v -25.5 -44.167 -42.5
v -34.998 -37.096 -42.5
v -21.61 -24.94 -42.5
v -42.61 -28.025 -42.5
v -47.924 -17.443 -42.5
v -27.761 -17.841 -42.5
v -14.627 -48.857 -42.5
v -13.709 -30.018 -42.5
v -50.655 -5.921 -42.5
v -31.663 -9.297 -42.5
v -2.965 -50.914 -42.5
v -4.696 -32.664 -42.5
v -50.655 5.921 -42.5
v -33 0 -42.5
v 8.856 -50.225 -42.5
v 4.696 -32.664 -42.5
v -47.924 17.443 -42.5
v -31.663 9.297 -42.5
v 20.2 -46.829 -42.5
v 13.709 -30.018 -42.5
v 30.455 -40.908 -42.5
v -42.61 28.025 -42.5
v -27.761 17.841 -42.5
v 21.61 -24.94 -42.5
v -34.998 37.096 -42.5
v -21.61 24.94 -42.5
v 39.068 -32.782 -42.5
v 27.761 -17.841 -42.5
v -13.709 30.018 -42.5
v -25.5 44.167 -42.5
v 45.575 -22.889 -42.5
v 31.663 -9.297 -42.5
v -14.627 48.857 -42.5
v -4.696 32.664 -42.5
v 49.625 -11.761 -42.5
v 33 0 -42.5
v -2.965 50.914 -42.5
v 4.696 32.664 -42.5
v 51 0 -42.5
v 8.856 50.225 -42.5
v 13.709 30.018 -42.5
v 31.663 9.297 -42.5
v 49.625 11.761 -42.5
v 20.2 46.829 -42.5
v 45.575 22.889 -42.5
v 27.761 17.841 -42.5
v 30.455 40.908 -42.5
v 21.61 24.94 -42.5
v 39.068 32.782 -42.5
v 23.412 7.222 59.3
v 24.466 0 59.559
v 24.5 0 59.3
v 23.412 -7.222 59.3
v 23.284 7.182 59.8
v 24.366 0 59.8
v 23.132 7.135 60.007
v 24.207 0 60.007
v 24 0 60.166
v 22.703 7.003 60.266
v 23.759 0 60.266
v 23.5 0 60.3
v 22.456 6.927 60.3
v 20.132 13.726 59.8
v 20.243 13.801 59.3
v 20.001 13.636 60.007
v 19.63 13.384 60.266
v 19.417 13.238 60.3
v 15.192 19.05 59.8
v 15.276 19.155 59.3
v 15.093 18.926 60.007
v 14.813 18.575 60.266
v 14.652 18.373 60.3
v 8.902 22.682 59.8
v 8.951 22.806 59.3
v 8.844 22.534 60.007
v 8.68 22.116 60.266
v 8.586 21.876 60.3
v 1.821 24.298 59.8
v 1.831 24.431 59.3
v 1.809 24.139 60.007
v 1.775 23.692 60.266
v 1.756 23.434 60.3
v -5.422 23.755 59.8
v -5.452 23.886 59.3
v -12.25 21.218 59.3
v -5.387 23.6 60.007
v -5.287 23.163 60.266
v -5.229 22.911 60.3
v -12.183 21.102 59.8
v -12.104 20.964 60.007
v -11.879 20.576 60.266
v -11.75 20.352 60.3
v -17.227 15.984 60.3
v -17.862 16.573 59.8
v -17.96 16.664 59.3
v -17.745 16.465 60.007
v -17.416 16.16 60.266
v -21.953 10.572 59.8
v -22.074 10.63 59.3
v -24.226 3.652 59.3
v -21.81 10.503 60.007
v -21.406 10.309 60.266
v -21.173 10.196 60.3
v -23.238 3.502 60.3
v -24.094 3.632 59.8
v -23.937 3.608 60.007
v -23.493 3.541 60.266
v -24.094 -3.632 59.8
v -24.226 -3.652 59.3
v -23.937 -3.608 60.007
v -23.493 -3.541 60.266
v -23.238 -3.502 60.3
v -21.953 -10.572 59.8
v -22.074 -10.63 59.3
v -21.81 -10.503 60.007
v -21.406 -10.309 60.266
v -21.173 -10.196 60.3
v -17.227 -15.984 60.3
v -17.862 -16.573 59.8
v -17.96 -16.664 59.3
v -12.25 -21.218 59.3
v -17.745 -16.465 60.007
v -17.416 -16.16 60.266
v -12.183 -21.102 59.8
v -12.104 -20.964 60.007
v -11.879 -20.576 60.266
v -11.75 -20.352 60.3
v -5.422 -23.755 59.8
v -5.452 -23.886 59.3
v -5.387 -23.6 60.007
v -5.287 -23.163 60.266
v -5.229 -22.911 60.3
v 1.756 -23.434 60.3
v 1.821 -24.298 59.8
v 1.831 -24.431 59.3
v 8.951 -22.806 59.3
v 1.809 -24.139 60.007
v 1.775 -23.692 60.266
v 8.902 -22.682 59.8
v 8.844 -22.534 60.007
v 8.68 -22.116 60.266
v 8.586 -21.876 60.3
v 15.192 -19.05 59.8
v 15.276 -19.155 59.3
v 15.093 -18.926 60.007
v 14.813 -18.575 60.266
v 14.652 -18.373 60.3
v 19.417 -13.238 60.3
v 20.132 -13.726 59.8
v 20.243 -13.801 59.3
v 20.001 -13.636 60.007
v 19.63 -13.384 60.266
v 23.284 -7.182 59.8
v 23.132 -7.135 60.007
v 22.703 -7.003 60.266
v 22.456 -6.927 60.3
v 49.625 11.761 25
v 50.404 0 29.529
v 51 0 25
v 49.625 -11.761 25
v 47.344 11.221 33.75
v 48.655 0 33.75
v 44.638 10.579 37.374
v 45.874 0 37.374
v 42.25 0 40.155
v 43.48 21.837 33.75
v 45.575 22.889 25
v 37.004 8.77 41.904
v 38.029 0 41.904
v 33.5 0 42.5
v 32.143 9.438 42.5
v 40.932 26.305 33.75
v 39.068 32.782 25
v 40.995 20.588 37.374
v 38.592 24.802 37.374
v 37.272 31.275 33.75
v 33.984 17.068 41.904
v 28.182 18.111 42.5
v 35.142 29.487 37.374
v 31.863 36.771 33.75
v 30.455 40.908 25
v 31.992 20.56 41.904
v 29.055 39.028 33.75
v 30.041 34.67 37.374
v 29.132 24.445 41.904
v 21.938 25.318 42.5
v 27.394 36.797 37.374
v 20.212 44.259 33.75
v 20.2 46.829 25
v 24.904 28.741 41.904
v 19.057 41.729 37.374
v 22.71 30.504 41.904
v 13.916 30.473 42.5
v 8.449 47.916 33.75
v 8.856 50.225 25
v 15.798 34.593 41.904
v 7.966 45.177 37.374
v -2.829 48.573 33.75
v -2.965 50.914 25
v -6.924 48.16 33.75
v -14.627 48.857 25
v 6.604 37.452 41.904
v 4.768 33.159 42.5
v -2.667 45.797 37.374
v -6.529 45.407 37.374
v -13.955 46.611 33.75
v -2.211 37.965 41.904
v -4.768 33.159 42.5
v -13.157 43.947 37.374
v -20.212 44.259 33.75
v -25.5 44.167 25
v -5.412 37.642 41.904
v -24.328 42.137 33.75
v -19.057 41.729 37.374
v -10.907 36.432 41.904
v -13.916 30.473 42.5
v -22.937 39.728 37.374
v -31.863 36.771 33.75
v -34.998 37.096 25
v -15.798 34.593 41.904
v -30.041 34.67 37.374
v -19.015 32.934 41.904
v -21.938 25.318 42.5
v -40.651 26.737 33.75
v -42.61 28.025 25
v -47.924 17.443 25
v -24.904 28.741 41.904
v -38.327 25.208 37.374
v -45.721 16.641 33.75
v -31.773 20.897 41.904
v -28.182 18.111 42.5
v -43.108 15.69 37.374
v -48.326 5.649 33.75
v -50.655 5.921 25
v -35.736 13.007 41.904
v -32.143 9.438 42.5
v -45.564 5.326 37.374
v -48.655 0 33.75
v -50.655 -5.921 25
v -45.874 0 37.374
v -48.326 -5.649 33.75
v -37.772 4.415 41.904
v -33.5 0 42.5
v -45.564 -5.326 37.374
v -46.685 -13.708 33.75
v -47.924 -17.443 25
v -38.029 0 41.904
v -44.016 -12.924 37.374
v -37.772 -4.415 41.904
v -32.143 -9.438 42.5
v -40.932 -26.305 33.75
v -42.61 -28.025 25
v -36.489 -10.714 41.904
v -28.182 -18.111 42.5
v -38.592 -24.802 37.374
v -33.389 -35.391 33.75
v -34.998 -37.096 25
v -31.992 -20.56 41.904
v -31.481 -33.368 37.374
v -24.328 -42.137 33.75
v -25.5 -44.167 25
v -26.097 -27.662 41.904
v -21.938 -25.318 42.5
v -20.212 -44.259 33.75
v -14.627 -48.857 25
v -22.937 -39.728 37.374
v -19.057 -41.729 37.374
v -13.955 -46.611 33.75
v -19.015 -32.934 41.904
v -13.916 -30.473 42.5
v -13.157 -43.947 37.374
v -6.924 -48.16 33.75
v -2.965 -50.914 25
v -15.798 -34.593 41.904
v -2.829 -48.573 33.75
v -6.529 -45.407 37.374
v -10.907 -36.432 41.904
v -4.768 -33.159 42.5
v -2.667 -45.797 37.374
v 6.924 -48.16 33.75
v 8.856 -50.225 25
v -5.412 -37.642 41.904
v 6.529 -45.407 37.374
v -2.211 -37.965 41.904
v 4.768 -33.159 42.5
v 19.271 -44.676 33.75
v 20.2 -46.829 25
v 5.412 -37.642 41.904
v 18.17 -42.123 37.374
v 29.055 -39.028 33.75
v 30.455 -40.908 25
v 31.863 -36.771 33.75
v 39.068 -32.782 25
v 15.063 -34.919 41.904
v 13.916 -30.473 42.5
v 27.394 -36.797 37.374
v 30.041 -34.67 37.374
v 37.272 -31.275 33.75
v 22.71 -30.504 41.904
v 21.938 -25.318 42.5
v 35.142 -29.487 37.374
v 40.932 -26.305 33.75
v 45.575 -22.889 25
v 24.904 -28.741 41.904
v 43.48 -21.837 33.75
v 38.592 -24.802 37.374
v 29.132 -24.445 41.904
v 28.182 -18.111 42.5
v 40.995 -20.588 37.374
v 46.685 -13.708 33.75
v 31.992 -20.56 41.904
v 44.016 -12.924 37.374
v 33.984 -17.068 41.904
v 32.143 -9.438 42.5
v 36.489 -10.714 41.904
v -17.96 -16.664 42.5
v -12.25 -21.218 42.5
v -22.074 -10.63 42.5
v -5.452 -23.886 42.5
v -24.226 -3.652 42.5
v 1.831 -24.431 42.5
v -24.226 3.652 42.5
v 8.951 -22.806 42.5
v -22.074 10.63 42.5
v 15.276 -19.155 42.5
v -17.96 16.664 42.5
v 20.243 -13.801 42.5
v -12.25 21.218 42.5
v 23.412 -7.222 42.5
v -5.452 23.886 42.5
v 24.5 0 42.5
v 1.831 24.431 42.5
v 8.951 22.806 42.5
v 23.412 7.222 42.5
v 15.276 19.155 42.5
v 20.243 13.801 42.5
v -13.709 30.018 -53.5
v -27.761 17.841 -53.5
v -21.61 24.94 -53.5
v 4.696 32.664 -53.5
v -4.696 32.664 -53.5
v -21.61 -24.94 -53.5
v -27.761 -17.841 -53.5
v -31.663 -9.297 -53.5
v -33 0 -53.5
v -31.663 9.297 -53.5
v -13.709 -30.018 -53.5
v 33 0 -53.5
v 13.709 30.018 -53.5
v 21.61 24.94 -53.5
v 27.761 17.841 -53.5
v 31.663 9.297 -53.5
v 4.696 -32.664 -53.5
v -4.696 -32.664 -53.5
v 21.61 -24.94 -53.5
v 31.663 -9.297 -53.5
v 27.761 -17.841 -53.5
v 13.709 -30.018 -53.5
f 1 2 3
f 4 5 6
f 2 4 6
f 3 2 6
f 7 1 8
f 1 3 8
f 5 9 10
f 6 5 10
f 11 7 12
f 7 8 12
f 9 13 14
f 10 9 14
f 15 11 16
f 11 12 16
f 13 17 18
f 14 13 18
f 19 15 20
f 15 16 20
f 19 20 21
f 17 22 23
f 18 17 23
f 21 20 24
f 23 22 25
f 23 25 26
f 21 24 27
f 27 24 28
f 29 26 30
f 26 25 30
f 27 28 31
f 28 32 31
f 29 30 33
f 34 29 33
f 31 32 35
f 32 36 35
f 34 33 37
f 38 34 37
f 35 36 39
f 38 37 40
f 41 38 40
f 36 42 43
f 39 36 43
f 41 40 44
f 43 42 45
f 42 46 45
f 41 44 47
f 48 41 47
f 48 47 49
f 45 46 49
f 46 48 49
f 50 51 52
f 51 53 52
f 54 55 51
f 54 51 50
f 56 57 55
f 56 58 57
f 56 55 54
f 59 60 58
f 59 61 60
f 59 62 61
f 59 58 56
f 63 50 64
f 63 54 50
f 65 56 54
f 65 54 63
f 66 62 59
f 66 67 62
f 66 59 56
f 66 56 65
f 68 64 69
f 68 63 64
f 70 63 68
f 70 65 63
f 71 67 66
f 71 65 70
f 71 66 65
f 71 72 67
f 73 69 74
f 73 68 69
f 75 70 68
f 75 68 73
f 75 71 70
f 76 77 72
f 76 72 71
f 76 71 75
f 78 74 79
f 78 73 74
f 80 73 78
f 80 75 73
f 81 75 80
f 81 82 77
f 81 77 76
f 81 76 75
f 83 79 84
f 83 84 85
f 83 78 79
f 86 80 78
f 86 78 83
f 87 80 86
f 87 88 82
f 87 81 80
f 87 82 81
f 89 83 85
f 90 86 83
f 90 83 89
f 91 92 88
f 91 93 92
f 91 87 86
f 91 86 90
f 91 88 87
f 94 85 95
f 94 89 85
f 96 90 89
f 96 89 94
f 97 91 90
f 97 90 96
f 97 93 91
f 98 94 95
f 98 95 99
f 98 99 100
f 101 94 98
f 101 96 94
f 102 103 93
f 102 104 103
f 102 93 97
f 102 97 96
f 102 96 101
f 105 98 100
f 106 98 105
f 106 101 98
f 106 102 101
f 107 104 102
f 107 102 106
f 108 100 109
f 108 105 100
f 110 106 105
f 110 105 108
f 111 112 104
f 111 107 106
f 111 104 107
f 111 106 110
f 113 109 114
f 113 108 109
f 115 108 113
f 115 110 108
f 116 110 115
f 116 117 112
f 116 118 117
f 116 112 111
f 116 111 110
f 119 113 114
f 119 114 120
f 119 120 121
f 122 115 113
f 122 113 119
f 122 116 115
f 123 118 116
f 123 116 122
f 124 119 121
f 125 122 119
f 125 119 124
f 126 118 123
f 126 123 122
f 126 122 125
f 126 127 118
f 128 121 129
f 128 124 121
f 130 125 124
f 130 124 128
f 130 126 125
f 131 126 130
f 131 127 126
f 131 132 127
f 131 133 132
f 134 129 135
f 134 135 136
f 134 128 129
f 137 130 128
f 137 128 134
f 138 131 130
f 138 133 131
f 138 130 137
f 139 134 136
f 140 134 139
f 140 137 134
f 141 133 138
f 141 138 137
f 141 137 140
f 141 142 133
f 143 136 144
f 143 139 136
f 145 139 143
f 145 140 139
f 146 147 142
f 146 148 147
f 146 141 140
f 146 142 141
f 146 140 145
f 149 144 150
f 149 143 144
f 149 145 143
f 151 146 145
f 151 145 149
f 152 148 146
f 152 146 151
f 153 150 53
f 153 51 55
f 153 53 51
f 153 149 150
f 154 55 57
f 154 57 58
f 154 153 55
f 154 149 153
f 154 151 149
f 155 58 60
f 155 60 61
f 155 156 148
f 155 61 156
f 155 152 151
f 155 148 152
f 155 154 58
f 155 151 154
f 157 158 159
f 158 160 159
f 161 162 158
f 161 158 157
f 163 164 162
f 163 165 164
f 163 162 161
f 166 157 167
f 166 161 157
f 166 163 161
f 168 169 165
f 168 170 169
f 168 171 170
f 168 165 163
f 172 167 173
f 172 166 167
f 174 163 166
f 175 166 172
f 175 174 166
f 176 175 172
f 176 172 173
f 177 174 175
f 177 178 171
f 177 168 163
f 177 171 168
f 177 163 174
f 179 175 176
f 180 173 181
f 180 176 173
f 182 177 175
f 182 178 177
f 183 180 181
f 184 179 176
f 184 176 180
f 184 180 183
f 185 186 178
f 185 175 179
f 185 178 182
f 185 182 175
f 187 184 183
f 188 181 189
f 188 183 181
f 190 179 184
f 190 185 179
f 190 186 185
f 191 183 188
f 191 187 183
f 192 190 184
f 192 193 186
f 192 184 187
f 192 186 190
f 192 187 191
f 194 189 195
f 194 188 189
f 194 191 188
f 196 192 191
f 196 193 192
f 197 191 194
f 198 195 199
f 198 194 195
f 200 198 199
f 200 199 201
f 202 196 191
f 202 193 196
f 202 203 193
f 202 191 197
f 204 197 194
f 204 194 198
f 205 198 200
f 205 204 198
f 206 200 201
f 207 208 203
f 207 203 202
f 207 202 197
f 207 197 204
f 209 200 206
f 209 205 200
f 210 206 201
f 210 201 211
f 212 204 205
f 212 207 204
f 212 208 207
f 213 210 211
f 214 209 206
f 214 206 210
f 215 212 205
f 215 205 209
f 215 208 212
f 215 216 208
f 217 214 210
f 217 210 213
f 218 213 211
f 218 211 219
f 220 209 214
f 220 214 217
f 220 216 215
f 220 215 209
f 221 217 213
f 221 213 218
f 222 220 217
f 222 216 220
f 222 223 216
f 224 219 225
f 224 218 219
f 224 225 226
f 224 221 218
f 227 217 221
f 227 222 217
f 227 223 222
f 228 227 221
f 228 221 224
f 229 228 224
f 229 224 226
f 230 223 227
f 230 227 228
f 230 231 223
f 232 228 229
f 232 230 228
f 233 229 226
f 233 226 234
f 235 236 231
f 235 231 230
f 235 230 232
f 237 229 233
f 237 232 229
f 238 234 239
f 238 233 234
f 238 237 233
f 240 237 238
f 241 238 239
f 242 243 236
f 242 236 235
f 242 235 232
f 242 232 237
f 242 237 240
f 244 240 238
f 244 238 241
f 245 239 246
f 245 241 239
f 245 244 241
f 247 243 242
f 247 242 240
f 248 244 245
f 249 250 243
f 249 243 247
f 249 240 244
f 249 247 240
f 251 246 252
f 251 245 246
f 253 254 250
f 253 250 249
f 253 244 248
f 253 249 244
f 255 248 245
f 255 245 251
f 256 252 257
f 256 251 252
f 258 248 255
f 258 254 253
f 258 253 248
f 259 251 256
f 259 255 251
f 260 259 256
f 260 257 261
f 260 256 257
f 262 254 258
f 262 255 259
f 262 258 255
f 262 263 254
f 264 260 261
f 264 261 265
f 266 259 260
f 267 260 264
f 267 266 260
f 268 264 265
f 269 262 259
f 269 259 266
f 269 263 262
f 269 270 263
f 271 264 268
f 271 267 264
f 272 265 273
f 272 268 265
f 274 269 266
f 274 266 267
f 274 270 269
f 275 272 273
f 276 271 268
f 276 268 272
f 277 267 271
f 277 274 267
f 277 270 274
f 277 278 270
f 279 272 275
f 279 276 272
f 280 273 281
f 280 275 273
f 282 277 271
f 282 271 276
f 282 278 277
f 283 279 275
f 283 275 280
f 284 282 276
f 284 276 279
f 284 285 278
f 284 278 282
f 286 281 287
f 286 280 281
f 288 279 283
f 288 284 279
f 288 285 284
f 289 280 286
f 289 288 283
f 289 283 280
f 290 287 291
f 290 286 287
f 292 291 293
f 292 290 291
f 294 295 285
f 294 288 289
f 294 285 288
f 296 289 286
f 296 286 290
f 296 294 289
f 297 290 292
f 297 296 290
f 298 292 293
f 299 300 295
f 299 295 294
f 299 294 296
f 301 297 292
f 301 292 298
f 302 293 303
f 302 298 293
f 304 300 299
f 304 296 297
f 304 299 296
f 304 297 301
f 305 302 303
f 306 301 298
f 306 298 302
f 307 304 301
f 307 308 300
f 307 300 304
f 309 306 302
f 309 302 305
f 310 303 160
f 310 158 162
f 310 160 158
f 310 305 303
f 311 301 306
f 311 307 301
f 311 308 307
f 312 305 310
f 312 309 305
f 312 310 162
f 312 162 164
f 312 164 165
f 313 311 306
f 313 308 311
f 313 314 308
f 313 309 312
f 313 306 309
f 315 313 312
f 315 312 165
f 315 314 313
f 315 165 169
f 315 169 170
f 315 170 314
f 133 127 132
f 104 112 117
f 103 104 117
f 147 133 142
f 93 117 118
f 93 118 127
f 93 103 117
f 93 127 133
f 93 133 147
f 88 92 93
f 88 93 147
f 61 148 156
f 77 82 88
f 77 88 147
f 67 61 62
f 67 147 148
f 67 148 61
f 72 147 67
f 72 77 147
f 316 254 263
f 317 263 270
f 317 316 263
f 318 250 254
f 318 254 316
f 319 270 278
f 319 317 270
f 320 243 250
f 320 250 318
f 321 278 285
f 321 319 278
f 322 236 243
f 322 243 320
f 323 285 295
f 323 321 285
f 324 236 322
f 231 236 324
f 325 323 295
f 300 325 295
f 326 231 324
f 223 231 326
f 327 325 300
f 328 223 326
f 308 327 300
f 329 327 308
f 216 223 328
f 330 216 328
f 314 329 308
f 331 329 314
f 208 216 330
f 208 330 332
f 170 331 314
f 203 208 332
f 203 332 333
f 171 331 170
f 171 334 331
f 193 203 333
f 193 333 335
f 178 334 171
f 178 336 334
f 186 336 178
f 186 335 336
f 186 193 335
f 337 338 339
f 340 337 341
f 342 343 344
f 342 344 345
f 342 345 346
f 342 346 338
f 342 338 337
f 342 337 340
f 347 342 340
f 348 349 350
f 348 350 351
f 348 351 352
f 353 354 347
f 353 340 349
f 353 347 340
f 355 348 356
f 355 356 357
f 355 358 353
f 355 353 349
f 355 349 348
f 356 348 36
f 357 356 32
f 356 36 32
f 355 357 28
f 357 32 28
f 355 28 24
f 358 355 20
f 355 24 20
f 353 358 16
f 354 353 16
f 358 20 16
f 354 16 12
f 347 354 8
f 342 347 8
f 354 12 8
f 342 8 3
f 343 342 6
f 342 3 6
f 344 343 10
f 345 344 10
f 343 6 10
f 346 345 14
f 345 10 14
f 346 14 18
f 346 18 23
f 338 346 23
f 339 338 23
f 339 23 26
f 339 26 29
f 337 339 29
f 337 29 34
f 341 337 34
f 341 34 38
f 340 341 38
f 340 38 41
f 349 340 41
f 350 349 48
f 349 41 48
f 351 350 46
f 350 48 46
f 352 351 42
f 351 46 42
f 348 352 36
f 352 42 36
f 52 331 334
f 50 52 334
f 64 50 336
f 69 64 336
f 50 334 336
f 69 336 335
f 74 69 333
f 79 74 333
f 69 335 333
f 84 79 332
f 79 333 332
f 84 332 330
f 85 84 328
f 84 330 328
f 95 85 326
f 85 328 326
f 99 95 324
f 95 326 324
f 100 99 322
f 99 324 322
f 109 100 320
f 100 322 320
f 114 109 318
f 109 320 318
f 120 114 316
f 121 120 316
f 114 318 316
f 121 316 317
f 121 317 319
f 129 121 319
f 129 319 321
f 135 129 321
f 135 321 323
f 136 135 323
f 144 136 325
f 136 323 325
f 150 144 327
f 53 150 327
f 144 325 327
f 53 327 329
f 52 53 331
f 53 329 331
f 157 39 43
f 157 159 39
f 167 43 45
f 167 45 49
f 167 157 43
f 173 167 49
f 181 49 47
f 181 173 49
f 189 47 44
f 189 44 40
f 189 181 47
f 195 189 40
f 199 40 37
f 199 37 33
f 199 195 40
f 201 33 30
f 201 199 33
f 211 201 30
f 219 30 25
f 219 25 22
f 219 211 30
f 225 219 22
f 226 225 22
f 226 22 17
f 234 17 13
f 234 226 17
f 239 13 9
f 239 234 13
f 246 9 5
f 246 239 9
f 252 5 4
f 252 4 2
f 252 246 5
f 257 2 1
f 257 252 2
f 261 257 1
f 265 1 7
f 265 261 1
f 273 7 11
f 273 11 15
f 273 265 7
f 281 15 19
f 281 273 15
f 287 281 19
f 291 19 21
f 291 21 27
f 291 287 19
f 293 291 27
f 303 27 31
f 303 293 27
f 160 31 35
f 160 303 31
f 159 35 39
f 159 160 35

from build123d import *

# Parameters (mm, degrees)
F0_R     = 51
F1_DEPTH = 42.5
F2_R     = 17.5
F3_R     = 24.5
F4_DEPTH = 17.8
F5_R     = 1
F6_DEPTH = 42.5
F7_R     = 33
F8_DEPTH = 11


# Not quite as in the source:
# - a feature of the source that left no trace in its solid (it failed there, or was rolled back) is left out


with BuildPart() as f1:
    # F0 (on Top) → F1 (new body)
    with BuildSketch(Plane.XY):
        Circle(F0_R)
    extrude(amount=F1_DEPTH)

    # F2
    f2_edges = [f1.edges().sort_by_distance(p)[0] for p in [
        (-51, 0, 42.5),
    ]]
    fillet(f2_edges, radius=F2_R)

    # F3 (on face) → F4 (join)
    with BuildSketch(Plane.XY.offset(42.5)):
        Circle(F3_R)
    extrude(amount=F4_DEPTH)

    # F5
    f5_edges = [f1.edges().sort_by_distance(p)[0] for p in [
        (-24.5, 0, 60.3),
    ]]
    fillet(f5_edges, radius=F5_R)

    # F6 (add): a face of the model
    f6_faces = [f1.faces().sort_by_distance(p)[0] for p in [
        (0, 0, 0),
    ]]
    extrude(f6_faces, amount=F6_DEPTH)

    # F7 (on face) → F8 (join)
    with BuildSketch(Plane(origin=(0, 0, -42.5), x_dir=(1, 0, 0), z_dir=(0, 0, -1))):
        Circle(F7_R)
    extrude(amount=F8_DEPTH)


solid = f1.part
